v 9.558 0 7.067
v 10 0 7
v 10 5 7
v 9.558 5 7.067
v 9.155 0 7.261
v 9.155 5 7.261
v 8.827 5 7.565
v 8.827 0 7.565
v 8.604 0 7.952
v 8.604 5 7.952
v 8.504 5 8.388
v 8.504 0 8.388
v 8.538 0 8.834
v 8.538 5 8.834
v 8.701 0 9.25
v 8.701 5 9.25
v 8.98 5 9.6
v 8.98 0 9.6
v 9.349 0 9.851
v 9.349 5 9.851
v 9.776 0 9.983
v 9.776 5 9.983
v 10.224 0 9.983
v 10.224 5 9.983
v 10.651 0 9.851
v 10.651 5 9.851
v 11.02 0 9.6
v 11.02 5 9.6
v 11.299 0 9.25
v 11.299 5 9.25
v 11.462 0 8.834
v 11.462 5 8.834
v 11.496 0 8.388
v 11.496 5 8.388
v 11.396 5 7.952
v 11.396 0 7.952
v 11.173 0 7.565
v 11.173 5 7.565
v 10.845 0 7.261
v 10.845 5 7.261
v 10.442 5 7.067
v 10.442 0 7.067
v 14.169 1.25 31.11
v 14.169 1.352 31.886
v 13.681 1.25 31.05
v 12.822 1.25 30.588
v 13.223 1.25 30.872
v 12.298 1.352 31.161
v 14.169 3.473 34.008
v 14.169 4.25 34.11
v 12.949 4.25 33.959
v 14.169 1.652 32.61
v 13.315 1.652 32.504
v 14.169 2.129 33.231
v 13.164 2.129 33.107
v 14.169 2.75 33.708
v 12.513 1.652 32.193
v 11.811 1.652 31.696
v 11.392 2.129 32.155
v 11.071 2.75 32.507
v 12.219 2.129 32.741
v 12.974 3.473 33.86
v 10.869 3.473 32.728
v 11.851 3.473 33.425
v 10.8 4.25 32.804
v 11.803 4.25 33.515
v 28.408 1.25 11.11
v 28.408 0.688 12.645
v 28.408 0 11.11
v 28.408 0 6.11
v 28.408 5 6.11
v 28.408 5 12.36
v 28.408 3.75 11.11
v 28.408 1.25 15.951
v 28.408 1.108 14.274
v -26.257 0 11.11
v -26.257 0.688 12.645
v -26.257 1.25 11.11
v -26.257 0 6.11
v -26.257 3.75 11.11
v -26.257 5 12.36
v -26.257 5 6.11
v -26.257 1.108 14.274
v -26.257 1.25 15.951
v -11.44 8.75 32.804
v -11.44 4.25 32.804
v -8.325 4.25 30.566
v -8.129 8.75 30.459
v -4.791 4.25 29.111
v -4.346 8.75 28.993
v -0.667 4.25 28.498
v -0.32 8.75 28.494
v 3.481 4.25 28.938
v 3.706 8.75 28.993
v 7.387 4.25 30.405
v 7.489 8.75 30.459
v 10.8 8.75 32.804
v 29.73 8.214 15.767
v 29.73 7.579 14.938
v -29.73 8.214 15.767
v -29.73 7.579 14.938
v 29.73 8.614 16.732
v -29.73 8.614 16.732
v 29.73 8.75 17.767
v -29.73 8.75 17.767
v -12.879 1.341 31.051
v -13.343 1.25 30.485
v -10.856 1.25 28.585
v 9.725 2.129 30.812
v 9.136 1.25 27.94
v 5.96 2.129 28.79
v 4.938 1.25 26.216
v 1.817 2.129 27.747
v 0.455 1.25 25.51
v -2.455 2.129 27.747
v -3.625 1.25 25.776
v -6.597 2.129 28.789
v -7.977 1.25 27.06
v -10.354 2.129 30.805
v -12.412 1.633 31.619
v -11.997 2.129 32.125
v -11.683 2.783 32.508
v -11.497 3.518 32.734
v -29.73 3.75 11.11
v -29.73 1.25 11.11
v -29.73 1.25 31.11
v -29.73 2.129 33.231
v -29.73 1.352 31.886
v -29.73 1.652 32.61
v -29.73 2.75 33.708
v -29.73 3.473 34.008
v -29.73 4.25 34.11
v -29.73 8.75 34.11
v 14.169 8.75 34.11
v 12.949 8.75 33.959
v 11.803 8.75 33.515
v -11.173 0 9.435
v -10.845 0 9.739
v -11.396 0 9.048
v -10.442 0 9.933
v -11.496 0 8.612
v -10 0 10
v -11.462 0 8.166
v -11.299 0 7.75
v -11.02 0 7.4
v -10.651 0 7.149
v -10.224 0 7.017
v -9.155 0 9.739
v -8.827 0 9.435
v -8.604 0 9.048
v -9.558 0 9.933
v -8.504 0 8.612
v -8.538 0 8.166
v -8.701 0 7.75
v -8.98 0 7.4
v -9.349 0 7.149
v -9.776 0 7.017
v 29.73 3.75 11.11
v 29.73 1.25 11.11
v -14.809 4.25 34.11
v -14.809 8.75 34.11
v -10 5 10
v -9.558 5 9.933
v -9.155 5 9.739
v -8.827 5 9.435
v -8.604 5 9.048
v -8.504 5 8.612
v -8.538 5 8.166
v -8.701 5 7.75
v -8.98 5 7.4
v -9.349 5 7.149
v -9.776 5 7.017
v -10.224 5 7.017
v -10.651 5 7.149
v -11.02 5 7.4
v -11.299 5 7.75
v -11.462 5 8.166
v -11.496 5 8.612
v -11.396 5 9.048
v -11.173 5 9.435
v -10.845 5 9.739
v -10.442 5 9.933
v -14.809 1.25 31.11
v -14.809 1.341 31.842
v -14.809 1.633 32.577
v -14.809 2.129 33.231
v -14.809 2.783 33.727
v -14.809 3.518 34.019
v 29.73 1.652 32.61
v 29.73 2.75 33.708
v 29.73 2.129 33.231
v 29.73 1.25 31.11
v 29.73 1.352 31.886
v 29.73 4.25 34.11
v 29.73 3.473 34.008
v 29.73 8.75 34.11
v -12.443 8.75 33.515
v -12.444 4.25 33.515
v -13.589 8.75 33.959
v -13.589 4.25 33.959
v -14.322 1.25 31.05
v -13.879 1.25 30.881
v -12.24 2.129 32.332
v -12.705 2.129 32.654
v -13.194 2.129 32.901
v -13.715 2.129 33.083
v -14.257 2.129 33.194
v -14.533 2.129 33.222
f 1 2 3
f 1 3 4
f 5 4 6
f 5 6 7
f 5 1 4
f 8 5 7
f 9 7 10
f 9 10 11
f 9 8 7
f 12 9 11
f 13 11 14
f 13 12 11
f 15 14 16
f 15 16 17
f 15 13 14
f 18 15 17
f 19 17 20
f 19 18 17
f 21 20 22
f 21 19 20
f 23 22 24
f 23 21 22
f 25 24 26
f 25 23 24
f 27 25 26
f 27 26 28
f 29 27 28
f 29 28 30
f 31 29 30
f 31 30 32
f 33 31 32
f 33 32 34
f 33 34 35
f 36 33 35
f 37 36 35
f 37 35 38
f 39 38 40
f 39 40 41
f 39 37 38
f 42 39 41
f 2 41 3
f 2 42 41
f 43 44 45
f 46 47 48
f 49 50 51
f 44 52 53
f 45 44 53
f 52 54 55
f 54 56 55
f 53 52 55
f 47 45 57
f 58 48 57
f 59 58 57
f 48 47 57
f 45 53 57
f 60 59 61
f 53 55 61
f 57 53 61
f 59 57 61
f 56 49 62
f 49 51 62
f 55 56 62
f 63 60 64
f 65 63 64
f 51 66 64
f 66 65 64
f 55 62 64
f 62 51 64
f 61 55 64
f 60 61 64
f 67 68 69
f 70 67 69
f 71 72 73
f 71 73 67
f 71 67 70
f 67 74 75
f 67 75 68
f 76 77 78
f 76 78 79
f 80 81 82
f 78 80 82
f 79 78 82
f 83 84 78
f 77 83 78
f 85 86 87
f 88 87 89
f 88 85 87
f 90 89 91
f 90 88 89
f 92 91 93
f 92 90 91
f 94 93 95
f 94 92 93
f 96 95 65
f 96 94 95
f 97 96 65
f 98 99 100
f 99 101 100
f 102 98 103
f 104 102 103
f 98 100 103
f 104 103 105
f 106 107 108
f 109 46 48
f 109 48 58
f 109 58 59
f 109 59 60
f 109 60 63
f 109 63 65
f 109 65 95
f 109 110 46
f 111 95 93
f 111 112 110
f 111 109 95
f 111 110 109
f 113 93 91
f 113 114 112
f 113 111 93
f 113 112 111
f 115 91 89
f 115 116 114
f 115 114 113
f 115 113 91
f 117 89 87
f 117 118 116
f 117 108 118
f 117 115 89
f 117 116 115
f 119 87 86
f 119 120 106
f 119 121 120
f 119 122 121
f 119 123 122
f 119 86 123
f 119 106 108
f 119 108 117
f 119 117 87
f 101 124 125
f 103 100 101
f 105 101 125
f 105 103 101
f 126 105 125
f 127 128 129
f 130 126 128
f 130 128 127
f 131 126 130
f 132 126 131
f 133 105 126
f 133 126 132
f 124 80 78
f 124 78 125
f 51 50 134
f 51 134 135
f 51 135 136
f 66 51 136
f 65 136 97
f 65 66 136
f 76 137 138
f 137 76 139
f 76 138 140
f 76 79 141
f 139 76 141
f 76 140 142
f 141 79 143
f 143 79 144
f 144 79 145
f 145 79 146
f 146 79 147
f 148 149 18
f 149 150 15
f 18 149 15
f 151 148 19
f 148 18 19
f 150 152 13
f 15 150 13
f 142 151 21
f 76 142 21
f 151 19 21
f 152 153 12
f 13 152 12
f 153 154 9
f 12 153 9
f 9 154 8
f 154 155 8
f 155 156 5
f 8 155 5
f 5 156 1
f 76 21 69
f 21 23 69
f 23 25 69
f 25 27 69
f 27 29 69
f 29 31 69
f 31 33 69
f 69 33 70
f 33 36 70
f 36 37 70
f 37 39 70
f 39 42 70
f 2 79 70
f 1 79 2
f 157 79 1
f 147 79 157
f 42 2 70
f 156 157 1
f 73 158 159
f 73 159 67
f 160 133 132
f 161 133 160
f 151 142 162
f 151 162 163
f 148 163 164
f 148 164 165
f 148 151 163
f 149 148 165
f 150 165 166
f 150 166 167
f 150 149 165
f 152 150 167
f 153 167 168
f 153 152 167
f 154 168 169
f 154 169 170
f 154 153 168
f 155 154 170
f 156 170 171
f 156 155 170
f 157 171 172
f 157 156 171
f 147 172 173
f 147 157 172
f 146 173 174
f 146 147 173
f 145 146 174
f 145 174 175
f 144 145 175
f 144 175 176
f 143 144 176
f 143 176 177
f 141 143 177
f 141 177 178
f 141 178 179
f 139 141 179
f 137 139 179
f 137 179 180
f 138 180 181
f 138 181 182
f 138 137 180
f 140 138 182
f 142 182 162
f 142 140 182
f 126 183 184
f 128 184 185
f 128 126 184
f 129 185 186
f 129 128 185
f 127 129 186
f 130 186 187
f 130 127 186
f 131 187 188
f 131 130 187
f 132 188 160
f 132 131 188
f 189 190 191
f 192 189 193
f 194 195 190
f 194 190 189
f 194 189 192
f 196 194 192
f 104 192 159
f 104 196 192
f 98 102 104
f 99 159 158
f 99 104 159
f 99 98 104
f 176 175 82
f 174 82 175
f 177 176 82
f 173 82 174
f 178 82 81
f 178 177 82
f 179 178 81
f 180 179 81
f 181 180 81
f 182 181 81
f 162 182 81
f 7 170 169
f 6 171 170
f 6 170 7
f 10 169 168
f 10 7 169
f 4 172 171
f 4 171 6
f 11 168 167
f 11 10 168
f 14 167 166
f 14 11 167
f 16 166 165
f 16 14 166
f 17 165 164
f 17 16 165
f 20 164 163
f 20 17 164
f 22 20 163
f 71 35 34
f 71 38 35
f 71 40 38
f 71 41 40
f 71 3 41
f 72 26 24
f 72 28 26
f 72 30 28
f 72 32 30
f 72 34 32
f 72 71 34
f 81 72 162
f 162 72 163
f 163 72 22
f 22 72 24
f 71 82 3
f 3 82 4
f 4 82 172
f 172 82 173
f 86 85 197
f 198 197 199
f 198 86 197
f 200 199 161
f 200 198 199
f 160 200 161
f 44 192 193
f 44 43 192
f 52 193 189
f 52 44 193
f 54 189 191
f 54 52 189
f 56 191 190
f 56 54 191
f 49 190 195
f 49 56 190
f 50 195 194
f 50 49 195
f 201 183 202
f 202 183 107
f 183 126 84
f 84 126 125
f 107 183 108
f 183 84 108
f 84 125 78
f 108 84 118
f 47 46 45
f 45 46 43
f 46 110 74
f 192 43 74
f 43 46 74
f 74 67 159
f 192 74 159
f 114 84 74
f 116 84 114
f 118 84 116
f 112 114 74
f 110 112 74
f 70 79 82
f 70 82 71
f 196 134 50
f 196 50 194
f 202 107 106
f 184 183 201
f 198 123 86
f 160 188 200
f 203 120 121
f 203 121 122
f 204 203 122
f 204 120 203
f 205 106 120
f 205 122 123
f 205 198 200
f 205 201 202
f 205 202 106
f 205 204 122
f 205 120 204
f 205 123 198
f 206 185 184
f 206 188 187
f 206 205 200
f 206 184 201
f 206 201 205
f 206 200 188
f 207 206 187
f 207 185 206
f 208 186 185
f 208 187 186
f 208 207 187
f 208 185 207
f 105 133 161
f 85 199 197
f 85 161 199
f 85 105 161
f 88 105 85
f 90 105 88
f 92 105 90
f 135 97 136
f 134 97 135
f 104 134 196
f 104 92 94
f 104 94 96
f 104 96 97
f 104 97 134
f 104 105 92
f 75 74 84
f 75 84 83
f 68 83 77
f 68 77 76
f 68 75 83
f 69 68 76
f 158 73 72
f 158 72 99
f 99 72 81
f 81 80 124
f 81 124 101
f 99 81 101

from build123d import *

# Parameters (mm, degrees)
SKETCH_1_W          = 54.664318292
SKETCH_1_H          = 5
SKETCH_1_R          = 1.5
EXTRUDE_1_DEPTH     = 5
SKETCH_2_W          = 59.460193076
SKETCH_2_H          = 2.500348526
EXTRUDE_2_DEPTH     = 23
SKETCH_5_R          = 16.5
CUT_EXTRUDE_1_DEPTH = 15
EXTRUDE_START       = 5
EXTRUDE_3_DEPTH     = 5
CHAMFER_1_SIZE      = 5
FILLET_6_R          = 10
FILLET_7_R          = 4
FILLET_8_R          = 5
FILLET_9_R          = 3


with BuildPart() as part:
    # 草图1 → 凸台-拉伸1 (new body)
    with BuildSketch(Plane(origin=(0, 0, 0), x_dir=(1, 0, 0), z_dir=(0, 1, 0))):
        with Locations((1.075531559, -8.61)):
            Rectangle(SKETCH_1_W, SKETCH_1_H)
        with Locations(Location((-10, -8.5, 0), (0, 0, 270))):
            Circle(SKETCH_1_R, mode=Mode.SUBTRACT)
        with Locations(Location((10, -8.5, 0), (0, 0, 90))):
            Circle(SKETCH_1_R, mode=Mode.SUBTRACT)
    extrude(amount=EXTRUDE_1_DEPTH)

    # 草图2 → 凸台-拉伸2 (add)
    with BuildSketch(Plane.XY.offset(11.11)):
        with Locations((0, 2.5)):
            Rectangle(SKETCH_2_W, SKETCH_2_H)
    extrude(amount=EXTRUDE_2_DEPTH)

    # 草图5 → 切除-拉伸1 (cut)
    with BuildSketch(Plane(origin=(0, 3.750174263, 0), x_dir=(1, 0, 0), z_dir=(0, 1, 0))):
        with Locations((-0.32, -44.994124541)):
            Circle(SKETCH_5_R)
    extrude(amount=-CUT_EXTRUDE_1_DEPTH, mode=Mode.SUBTRACT)

    # 草图7 → 凸台-拉伸3 (add)
    with BuildSketch(Plane(origin=(0, 3.750174263, 0), x_dir=(1, 0, 0), z_dir=(0, 1, 0)).offset(EXTRUDE_START)):
        with BuildLine():
            Line((29.730096538, -11.11), (28.407690705, -11.11))
            Line((28.407690705, -11.11), (-26.256627587, -11.11))
            Line((-26.256627587, -11.11), (-29.730096538, -11.11))
            Line((-29.730096538, -11.11), (-29.730096538, -34.11))
            Line((-29.730096538, -34.11), (-12.721041608, -34.11))
            ThreePointArc((-12.721041608, -34.11), (-0.32, -28.494124541), (12.081041608, -34.11))
            Line((12.081041608, -34.11), (29.730096538, -34.11))
            Line((29.730096538, -34.11), (29.730096538, -11.11))
        make_face()
    extrude(amount=-EXTRUDE_3_DEPTH)

    # 倒角1
    # the kernel refuses this chamfer: 5 mm, written as the material it takes off along each edge
    with BuildSketch(Plane(origin=(-42.588511478, 8.750174263, 11.11), x_dir=(0, -0.9996219169112968, -0.027495876610586317), z_dir=(1, 0, 0))) as chamfer_1_piece_1_section:
        Polygon((CHAMFER_1_SIZE * 0.999621916911, -CHAMFER_1_SIZE * 0.0274958766106), (-CHAMFER_1_SIZE * 0.0274958766106, -CHAMFER_1_SIZE * 0.999621916911), (0, 0), align=None)
    chamfer_1_piece_1 = extrude(amount=85.177022955, mode=Mode.PRIVATE)
    chamfer_1_piece_1 = split(chamfer_1_piece_1, bisect_by=Plane(origin=(-34.422569532, 5, 11.399404242), z_dir=(0, -1, 0)), keep=Keep.TOP, mode=Mode.PRIVATE)
    chamfer_1_piece_1 = split(chamfer_1_piece_1, bisect_by=Plane(origin=(-26.256627587, 4.506210637, 11.399404242), z_dir=(-1, 0, 0)), keep=Keep.TOP, mode=Mode.PRIVATE)
    add(chamfer_1_piece_1, mode=Mode.SUBTRACT)
    with BuildSketch(Plane(origin=(-42.588511478, 8.750174263, 11.11), x_dir=(0, -0.9996219169112968, -0.027495876610586317), z_dir=(1, 0, 0))) as chamfer_1_piece_2_section:
        Polygon((CHAMFER_1_SIZE * 0.999621916911, -CHAMFER_1_SIZE * 0.0274958766106), (-CHAMFER_1_SIZE * 0.0274958766106, -CHAMFER_1_SIZE * 0.999621916911), (0, 0), align=None)
    chamfer_1_piece_2 = extrude(amount=85.177022955, mode=Mode.PRIVATE)
    chamfer_1_piece_2 = split(chamfer_1_piece_2, bisect_by=Plane(origin=(-34.422569532, 5, 12.869772417), z_dir=(0, 1, 0)), keep=Keep.TOP, mode=Mode.PRIVATE)
    chamfer_1_piece_2 = split(chamfer_1_piece_2, bisect_by=Plane(origin=(-26.256627587, 7.312697929, 12.869772417), z_dir=(-1, 0, 0)), keep=Keep.TOP, mode=Mode.PRIVATE)
    add(chamfer_1_piece_2, mode=Mode.SUBTRACT)
    with BuildSketch(Plane(origin=(-42.588511478, 8.750174263, 11.11), x_dir=(0, -0.9996219169112968, -0.027495876610586317), z_dir=(1, 0, 0))) as chamfer_1_piece_3_section:
        Polygon((CHAMFER_1_SIZE * 0.999621916911, -CHAMFER_1_SIZE * 0.0274958766106), (-CHAMFER_1_SIZE * 0.0274958766106, -CHAMFER_1_SIZE * 0.999621916911), (0, 0), align=None)
    chamfer_1_piece_3 = extrude(amount=85.177022955, mode=Mode.PRIVATE)
    chamfer_1_piece_3 = split(chamfer_1_piece_3, bisect_by=Plane(origin=(1.075531559, 5, 12.869772417), z_dir=(0, 1, 0)), keep=Keep.TOP, mode=Mode.PRIVATE)
    chamfer_1_piece_3 = split(chamfer_1_piece_3, bisect_by=Plane(origin=(28.407690705, 7.312697929, 12.869772417), z_dir=(-1, 0, 0)), keep=Keep.TOP, mode=Mode.PRIVATE)
    chamfer_1_piece_3 = split(chamfer_1_piece_3, bisect_by=Plane(origin=(-26.256627587, 7.312697929, 12.869772417), z_dir=(1, 0, 0)), keep=Keep.TOP, mode=Mode.PRIVATE)
    add(chamfer_1_piece_3, mode=Mode.SUBTRACT)
    with BuildSketch(Plane(origin=(-42.588511478, 8.750174263, 11.11), x_dir=(0, -0.9996219169112968, -0.027495876610586317), z_dir=(1, 0, 0))) as chamfer_1_piece_4_section:
        Polygon((CHAMFER_1_SIZE * 0.999621916911, -CHAMFER_1_SIZE * 0.0274958766106), (-CHAMFER_1_SIZE * 0.0274958766106, -CHAMFER_1_SIZE * 0.999621916911), (0, 0), align=None)
    chamfer_1_piece_4 = extrude(amount=85.177022955, mode=Mode.PRIVATE)
    chamfer_1_piece_4 = split(chamfer_1_piece_4, bisect_by=Plane(origin=(35.498101091, 5, 11.399404242), z_dir=(0, -1, 0)), keep=Keep.TOP, mode=Mode.PRIVATE)
    chamfer_1_piece_4 = split(chamfer_1_piece_4, bisect_by=Plane(origin=(28.407690705, 4.506210637, 11.399404242), z_dir=(1, 0, 0)), keep=Keep.TOP, mode=Mode.PRIVATE)
    add(chamfer_1_piece_4, mode=Mode.SUBTRACT)
    with BuildSketch(Plane(origin=(-42.588511478, 8.750174263, 11.11), x_dir=(0, -0.9996219169112968, -0.027495876610586317), z_dir=(1, 0, 0))) as chamfer_1_piece_5_section:
        Polygon((CHAMFER_1_SIZE * 0.999621916911, -CHAMFER_1_SIZE * 0.0274958766106), (-CHAMFER_1_SIZE * 0.0274958766106, -CHAMFER_1_SIZE * 0.999621916911), (0, 0), align=None)
    chamfer_1_piece_5 = extrude(amount=85.177022955, mode=Mode.PRIVATE)
    chamfer_1_piece_5 = split(chamfer_1_piece_5, bisect_by=Plane(origin=(35.498101091, 5, 12.869772417), z_dir=(0, 1, 0)), keep=Keep.TOP, mode=Mode.PRIVATE)
    chamfer_1_piece_5 = split(chamfer_1_piece_5, bisect_by=Plane(origin=(28.407690705, 7.312697929, 12.869772417), z_dir=(1, 0, 0)), keep=Keep.TOP, mode=Mode.PRIVATE)
    add(chamfer_1_piece_5, mode=Mode.SUBTRACT)

    # 圆角6
    # the kernel refuses this fillet: 10 mm, written as the material it adds along each edge
    with BuildSketch(Plane(origin=(28.407690705, 1.249825737, 11.11), x_dir=(0, 0, 1), z_dir=(-1, 0, 0))) as fillet_6_piece_1:
        with BuildLine():
            CenterArc((4.840914208, -10), FILLET_6_R, 90, 28.952961909)
            Line((0, -1.249825737), (0, 0))
            Line((0, 0), (4.840914208, 0))
        make_face()
    extrude(amount=54.664318292)

    # 圆角7
    fillet_7_edges = [part.edges().sort_by_distance(p)[0] for p in [
        (0, 8.750174263, 16.11),
    ]]
    fillet(fillet_7_edges, radius=FILLET_7_R)

    # 圆角8
    fillet_8_edges = [part.edges().sort_by_distance(p)[0] for p in [
        (-12.721041608, 5, 34.11),
        (12.081041608, 5, 34.11),
    ]]
    fillet(fillet_8_edges, radius=FILLET_8_R)

    # 圆角9
    fillet_9_edges = [part.edges().sort_by_distance(p)[0] for p in [
        (-0.32, 1.249825737, 28.494124541),
        (21.949780623, 1.249825737, 34.11),
        (12.362521469, 1.249825737, 33.772076375),
        (-13.002521469, 1.249825737, 33.772076375),
        (-22.269780623, 1.249825737, 34.11),
    ]]
    fillet(fillet_9_edges, radius=FILLET_9_R)


solid = part.part
